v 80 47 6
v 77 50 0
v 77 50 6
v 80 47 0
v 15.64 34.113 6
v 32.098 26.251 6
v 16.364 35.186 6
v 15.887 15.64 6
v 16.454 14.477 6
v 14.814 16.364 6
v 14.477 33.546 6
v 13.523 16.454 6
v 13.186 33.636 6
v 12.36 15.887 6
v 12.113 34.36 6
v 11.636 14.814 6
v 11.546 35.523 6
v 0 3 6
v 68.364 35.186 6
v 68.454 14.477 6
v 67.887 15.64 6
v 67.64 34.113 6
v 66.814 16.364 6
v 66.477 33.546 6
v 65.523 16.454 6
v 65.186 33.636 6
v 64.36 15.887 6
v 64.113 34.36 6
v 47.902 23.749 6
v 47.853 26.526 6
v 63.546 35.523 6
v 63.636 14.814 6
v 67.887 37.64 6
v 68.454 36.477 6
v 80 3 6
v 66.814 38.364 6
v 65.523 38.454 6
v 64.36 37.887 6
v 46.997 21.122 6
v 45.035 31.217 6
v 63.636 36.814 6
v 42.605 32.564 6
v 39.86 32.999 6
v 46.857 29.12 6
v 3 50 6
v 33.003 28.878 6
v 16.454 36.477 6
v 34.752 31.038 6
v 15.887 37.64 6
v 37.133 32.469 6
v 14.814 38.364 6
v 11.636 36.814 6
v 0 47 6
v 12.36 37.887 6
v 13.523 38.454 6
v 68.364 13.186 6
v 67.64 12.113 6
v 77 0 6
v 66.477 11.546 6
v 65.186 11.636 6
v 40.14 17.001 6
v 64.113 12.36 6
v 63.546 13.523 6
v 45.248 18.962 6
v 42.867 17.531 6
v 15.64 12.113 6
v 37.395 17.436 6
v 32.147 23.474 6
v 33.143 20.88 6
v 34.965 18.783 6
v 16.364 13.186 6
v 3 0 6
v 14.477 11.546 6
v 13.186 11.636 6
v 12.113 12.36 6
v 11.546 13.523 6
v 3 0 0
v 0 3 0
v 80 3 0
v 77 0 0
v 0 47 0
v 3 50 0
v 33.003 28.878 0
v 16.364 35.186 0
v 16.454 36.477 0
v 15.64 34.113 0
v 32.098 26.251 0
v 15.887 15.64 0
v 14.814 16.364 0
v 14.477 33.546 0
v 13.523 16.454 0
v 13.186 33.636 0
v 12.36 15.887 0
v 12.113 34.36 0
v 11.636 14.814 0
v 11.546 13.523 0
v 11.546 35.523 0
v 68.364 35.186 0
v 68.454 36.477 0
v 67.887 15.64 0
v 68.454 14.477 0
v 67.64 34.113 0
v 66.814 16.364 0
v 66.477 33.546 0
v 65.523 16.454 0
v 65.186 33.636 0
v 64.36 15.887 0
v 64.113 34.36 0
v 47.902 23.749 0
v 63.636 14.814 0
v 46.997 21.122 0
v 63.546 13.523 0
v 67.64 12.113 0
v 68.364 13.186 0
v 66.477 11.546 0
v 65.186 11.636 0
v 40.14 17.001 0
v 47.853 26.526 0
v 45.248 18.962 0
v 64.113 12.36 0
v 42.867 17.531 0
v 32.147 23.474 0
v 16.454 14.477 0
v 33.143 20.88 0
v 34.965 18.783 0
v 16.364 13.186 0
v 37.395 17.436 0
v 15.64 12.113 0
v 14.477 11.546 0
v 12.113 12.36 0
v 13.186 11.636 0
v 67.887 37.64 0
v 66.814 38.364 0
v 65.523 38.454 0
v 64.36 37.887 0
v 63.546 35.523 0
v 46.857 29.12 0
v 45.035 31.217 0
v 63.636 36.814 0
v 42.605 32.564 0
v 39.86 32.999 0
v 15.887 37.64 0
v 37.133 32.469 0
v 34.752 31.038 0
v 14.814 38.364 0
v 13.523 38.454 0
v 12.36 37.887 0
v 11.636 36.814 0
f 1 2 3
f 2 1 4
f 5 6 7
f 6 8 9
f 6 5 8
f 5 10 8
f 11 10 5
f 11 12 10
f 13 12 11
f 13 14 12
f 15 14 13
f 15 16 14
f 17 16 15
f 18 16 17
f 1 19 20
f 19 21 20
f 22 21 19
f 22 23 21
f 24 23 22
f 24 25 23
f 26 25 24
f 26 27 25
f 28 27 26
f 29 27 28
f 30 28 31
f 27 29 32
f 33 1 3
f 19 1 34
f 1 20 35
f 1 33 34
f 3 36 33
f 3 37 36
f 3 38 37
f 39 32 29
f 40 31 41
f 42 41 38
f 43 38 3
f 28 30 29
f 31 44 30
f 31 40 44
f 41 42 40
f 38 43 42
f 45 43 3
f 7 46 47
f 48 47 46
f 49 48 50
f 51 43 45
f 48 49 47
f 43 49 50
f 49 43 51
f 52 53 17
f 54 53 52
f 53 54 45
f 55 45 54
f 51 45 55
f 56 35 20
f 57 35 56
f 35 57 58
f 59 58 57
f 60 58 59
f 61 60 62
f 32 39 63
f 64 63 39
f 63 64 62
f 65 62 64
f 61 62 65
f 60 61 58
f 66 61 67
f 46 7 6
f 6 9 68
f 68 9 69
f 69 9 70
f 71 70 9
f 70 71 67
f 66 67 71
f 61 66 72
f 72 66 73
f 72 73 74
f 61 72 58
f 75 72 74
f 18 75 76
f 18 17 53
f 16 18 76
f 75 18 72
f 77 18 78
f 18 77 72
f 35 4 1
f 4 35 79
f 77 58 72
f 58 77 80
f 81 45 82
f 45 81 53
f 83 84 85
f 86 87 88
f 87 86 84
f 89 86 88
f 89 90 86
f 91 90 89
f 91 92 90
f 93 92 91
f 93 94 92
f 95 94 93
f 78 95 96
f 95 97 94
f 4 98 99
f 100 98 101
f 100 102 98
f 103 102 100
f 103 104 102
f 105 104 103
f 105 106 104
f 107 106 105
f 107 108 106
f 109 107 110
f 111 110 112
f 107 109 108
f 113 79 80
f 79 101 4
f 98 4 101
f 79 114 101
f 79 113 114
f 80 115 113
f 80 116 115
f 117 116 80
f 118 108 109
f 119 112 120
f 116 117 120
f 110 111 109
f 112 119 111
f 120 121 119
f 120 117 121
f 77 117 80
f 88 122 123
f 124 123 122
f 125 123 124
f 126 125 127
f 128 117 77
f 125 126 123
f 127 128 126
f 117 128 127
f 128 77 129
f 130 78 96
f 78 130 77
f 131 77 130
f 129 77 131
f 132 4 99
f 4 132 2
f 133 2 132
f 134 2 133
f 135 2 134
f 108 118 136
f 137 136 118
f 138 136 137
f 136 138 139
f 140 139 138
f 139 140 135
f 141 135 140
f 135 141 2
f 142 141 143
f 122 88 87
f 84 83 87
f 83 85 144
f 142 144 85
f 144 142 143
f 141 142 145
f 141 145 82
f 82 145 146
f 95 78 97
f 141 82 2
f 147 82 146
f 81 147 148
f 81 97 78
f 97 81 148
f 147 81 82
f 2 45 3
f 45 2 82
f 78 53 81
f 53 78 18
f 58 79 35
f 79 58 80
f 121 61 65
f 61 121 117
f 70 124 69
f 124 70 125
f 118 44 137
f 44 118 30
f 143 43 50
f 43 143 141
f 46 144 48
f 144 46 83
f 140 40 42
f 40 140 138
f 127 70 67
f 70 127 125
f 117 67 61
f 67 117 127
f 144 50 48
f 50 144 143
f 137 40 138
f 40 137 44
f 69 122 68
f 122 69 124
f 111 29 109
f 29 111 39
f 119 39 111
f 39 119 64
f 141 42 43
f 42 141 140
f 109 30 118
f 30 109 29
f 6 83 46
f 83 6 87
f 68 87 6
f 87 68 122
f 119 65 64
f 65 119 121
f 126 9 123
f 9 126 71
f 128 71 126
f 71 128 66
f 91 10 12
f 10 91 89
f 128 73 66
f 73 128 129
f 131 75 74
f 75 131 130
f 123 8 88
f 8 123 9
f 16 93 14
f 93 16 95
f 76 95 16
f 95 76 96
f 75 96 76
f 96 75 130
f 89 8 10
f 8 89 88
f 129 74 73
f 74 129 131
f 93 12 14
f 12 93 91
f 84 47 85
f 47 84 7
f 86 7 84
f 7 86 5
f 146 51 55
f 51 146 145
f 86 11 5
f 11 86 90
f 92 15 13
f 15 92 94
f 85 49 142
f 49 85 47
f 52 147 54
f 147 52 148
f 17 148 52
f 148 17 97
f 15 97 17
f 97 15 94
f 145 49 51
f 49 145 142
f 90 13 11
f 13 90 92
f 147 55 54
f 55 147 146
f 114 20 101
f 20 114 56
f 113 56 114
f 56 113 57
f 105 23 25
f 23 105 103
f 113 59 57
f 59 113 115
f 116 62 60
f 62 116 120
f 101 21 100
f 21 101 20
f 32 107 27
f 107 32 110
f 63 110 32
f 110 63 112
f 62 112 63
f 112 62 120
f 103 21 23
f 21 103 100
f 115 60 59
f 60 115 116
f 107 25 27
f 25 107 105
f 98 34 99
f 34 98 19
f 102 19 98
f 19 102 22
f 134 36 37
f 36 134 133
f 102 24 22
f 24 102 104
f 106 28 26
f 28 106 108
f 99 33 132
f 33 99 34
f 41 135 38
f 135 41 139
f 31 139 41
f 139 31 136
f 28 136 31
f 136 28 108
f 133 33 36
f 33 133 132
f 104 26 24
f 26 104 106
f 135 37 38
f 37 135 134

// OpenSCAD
$fn = 32;

// ----------------------------------------------------------------------
// Spacer plate: rect 80 x 50
// ----------------------------------------------------------------------

// --- parameters (mm) ---
bore_r = 8;               // centre bore radius
bolt_r = 2.5;             // bolt hole radius
plate_t = 6;              // plate thickness, Z (extrusion height)
plate_l = 80;             // plate length, X
plate_w = 50;             // plate width, Y
inset = 14;               // corner hole inset

profile = [[3, 0], [77, 0], [80, 3], [80, 47], [77, 50], [3, 50], [0, 47], [0, 3]];  // primary outline, 8 points, counter clockwise
void_1 = [[47.853, 26.526], [46.857, 29.12], [45.035, 31.217], [42.605, 32.564], [39.86, 32.999], [37.133, 32.469], [34.752, 31.038], [33.003, 28.878], [32.098, 26.251], [32.147, 23.474], [33.143, 20.88], [34.965, 18.783], [37.395, 17.436], [40.14, 17.001], [42.867, 17.531], [45.248, 18.962], [46.997, 21.122], [47.902, 23.749]];  // centre bore, 18 points
void_2 = [[16.454, 14.477], [15.887, 15.64], [14.814, 16.364], [13.523, 16.454], [12.36, 15.887], [11.636, 14.814], [11.546, 13.523], [12.113, 12.36], [13.186, 11.636], [14.477, 11.546], [15.64, 12.113], [16.364, 13.186]];  // corner hole, 12 points
void_3 = [[16.454, 36.477], [15.887, 37.64], [14.814, 38.364], [13.523, 38.454], [12.36, 37.887], [11.636, 36.814], [11.546, 35.523], [12.113, 34.36], [13.186, 33.636], [14.477, 33.546], [15.64, 34.113], [16.364, 35.186]];  // corner hole, 12 points
void_4 = [[68.454, 14.477], [67.887, 15.64], [66.814, 16.364], [65.523, 16.454], [64.36, 15.887], [63.636, 14.814], [63.546, 13.523], [64.113, 12.36], [65.186, 11.636], [66.477, 11.546], [67.64, 12.113], [68.364, 13.186]];  // corner hole, 12 points
void_5 = [[68.454, 36.477], [67.887, 37.64], [66.814, 38.364], [65.523, 38.454], [64.36, 37.887], [63.636, 36.814], [63.546, 35.523], [64.113, 34.36], [65.186, 33.636], [66.477, 33.546], [67.64, 34.113], [68.364, 35.186]];  // corner hole, 12 points

// --- the one profile operation ---
difference() {
  linear_extrude(height = plate_t) polygon(points = profile);
  translate([0, 0, -1])
    linear_extrude(height = plate_t + 2) polygon(points = void_1);
  translate([0, 0, -1])
    linear_extrude(height = plate_t + 2) polygon(points = void_2);
  translate([0, 0, -1])
    linear_extrude(height = plate_t + 2) polygon(points = void_3);
  translate([0, 0, -1])
    linear_extrude(height = plate_t + 2) polygon(points = void_4);
  translate([0, 0, -1])
    linear_extrude(height = plate_t + 2) polygon(points = void_5);
}
